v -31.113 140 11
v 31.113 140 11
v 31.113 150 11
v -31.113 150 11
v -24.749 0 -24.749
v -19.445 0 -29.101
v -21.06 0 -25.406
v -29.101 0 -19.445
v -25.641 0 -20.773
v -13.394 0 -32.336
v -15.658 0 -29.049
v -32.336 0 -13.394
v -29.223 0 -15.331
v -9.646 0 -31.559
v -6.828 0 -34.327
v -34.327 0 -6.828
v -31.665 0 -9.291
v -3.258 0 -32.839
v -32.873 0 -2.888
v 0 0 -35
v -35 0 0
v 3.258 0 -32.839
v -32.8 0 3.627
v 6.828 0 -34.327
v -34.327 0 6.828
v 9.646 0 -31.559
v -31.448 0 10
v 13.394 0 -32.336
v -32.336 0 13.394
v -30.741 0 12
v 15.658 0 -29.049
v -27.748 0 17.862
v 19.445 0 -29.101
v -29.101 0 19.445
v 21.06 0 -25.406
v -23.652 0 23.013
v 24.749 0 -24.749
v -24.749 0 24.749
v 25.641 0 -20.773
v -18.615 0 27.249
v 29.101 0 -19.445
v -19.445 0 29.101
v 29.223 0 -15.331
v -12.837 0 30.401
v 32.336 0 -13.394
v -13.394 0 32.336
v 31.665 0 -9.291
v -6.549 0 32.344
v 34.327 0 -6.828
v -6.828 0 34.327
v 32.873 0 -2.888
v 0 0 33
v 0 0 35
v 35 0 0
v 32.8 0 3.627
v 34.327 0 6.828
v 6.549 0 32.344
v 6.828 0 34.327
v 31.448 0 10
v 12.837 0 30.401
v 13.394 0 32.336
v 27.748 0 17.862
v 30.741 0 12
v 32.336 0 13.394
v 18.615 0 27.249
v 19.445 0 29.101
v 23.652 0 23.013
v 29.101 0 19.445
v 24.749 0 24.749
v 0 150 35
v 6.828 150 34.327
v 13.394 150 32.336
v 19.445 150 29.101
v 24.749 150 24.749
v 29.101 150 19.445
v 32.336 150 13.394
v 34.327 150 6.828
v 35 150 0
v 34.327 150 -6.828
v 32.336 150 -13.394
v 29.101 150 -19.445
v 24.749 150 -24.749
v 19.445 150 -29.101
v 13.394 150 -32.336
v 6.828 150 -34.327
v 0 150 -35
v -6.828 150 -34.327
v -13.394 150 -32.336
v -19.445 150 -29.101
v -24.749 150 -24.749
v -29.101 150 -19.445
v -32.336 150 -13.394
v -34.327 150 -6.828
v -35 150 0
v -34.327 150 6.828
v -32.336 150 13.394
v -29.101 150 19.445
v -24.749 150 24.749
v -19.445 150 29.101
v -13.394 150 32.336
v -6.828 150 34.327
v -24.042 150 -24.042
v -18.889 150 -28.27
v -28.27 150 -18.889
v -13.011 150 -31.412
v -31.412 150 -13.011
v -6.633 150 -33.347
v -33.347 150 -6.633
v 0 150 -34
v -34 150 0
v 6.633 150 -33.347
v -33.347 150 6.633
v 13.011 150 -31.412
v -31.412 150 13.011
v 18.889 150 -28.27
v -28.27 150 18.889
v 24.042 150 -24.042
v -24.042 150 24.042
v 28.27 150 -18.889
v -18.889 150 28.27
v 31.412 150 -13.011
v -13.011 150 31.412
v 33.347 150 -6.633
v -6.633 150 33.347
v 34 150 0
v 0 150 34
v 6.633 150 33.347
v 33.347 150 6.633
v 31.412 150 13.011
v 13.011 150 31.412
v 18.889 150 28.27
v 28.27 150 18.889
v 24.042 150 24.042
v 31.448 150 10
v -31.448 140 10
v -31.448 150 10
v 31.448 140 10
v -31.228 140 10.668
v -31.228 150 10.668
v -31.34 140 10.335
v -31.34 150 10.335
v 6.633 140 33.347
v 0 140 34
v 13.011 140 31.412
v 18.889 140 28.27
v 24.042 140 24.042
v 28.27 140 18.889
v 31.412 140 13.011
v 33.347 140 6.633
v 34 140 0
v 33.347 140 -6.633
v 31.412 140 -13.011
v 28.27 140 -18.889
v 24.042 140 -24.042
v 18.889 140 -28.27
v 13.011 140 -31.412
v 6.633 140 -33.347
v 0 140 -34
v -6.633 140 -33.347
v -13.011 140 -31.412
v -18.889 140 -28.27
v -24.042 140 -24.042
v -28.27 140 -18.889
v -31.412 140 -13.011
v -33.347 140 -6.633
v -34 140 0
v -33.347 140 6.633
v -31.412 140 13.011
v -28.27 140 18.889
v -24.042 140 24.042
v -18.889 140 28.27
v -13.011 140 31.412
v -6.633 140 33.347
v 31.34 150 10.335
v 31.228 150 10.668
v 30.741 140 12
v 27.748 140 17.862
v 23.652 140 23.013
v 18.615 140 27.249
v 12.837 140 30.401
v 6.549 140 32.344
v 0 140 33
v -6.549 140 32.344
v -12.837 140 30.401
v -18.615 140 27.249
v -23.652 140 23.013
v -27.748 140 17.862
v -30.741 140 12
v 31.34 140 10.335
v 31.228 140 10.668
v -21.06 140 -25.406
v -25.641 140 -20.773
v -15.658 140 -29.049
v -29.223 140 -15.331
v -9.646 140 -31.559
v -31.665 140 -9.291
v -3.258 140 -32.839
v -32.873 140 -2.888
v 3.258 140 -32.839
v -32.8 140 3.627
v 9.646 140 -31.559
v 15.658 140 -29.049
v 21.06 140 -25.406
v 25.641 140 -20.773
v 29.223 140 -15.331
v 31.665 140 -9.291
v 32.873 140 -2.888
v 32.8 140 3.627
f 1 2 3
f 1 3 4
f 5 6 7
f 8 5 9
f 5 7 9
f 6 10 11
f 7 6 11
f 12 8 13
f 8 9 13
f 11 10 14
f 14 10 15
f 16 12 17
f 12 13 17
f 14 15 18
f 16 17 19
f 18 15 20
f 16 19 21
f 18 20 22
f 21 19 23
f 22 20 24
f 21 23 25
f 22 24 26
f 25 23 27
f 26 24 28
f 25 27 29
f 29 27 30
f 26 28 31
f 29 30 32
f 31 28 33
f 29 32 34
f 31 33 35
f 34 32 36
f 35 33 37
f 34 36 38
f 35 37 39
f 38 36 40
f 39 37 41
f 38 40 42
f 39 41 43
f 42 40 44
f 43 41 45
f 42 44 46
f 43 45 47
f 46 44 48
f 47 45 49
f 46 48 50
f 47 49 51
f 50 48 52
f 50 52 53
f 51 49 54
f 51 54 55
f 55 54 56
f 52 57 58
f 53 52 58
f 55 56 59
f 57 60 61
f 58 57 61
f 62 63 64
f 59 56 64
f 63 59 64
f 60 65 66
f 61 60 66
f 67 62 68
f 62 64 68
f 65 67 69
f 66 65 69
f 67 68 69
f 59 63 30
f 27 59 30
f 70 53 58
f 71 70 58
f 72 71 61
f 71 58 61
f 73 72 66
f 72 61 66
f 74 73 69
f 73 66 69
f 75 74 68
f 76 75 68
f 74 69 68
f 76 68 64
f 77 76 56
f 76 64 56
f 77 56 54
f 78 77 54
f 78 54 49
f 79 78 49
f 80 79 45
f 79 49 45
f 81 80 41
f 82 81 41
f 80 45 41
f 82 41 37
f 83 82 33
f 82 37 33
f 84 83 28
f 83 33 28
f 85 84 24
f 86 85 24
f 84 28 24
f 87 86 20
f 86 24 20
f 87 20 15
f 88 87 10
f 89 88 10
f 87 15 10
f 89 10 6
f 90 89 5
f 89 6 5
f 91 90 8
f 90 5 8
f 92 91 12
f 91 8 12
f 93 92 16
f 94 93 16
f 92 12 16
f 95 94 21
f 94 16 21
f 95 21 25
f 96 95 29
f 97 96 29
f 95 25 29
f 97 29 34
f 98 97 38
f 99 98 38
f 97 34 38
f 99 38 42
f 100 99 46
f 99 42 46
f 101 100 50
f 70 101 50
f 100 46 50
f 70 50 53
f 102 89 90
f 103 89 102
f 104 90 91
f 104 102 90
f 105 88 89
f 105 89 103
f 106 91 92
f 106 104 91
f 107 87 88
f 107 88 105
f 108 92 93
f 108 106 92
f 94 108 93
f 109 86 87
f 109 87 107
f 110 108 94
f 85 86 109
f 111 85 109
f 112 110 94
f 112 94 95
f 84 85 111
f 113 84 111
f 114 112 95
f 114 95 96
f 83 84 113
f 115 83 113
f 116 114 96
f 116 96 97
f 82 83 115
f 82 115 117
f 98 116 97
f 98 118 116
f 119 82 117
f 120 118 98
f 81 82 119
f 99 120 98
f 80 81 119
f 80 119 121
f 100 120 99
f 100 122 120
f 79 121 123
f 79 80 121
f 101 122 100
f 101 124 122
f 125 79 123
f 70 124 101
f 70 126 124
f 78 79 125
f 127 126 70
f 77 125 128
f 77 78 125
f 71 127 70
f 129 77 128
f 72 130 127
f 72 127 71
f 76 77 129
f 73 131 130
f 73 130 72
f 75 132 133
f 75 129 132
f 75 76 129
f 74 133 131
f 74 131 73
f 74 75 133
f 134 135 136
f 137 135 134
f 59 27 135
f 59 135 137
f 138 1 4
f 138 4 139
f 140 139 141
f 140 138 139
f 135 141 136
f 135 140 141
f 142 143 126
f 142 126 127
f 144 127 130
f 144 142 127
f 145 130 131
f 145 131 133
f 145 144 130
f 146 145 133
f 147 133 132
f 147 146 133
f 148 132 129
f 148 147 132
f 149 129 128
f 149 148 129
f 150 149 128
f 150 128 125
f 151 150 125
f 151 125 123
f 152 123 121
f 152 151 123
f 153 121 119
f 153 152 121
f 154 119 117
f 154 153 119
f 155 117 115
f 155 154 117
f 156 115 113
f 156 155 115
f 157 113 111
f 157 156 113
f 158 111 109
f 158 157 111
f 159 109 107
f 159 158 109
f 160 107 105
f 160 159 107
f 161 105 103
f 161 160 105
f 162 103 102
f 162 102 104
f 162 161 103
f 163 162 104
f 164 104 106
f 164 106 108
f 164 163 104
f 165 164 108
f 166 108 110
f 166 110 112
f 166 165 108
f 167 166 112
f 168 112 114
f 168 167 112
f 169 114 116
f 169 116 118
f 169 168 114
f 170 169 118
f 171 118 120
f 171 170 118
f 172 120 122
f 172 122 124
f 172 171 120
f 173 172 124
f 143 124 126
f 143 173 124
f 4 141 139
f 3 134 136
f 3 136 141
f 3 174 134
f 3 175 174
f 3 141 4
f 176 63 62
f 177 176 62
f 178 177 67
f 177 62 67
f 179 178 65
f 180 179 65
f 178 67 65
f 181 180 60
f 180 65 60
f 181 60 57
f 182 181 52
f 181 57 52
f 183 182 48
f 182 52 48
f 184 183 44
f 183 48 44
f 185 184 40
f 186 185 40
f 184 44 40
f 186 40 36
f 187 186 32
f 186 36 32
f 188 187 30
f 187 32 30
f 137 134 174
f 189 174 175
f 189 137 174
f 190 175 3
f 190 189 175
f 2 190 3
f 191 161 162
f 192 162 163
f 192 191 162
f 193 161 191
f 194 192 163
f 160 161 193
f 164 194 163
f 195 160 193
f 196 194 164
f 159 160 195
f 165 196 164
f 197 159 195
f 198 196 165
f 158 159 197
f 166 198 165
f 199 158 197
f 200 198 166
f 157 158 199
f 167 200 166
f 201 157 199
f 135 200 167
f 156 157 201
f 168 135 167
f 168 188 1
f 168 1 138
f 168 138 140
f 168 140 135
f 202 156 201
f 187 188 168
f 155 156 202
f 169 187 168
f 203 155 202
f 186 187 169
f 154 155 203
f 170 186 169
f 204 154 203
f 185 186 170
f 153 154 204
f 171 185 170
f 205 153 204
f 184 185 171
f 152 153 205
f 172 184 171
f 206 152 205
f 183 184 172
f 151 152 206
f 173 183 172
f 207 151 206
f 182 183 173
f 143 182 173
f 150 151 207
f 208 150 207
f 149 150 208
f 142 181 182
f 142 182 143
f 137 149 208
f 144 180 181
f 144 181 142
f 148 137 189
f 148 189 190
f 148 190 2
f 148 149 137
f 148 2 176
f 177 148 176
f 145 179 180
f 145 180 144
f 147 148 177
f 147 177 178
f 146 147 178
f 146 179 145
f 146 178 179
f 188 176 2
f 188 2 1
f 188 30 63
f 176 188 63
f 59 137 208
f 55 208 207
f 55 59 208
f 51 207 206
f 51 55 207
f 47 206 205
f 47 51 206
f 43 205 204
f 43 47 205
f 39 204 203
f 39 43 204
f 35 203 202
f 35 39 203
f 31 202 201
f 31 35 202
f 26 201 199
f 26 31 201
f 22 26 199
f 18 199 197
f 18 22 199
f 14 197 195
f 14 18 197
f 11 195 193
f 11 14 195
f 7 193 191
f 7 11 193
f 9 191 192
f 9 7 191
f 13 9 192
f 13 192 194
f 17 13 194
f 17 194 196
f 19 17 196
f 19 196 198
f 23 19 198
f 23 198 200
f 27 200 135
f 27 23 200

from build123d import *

# Parameters (mm, degrees)
SKETCH1_R           = 35
BOSS_EXTRUDE1_DEPTH = 150
CUT_EXTRUDE1_START  = -10
SKETCH3_R           = 34
CUT_EXTRUDE1_DEPTH  = 10


with BuildPart() as part:
    # Sketch1 → Boss-Extrude1 (new body)
    with BuildSketch(Plane(origin=(0, 0, 0), x_dir=(1, 0, 0), z_dir=(0, 1, 0))):
        with Locations(Location((0, 0, 0), (0, 0, 270))):
            Circle(SKETCH1_R)
        with BuildLine():
            Line((-31.448370387, -10), (31.448370387, -10))
            ThreePointArc((31.448370387, -10), (0, 33), (-31.448370387, -10))
        make_face(mode=Mode.SUBTRACT)
        with BuildLine():
            Line((-30.740852298, -12), (30.740852298, -12))
            ThreePointArc((30.740852298, -12), (0, -33), (-30.740852298, -12))
        make_face(mode=Mode.SUBTRACT)
    extrude(amount=BOSS_EXTRUDE1_DEPTH)

    # Sketch3 → Cut-Extrude1 (cut)
    with BuildSketch(Plane(origin=(0, 150, 0), x_dir=(1, 0, 0), z_dir=(0, 1, 0)).offset(CUT_EXTRUDE1_START)):
        with Locations(Location((0, 0, 0), (0, 0, 270))):
            Circle(SKETCH3_R)
        with BuildLine():
            Line((31.112698372, -11), (-31.112698372, -11))
            ThreePointArc((-31.112698372, -11), (0, 33), (31.112698372, -11))
        make_face(mode=Mode.SUBTRACT)
        with BuildLine():
            Line((-30.740852298, -12), (30.740852298, -12))
            ThreePointArc((30.740852298, -12), (0, -33), (-30.740852298, -12))
        make_face(mode=Mode.SUBTRACT)
    extrude(amount=CUT_EXTRUDE1_DEPTH, mode=Mode.SUBTRACT)


solid = part.part
